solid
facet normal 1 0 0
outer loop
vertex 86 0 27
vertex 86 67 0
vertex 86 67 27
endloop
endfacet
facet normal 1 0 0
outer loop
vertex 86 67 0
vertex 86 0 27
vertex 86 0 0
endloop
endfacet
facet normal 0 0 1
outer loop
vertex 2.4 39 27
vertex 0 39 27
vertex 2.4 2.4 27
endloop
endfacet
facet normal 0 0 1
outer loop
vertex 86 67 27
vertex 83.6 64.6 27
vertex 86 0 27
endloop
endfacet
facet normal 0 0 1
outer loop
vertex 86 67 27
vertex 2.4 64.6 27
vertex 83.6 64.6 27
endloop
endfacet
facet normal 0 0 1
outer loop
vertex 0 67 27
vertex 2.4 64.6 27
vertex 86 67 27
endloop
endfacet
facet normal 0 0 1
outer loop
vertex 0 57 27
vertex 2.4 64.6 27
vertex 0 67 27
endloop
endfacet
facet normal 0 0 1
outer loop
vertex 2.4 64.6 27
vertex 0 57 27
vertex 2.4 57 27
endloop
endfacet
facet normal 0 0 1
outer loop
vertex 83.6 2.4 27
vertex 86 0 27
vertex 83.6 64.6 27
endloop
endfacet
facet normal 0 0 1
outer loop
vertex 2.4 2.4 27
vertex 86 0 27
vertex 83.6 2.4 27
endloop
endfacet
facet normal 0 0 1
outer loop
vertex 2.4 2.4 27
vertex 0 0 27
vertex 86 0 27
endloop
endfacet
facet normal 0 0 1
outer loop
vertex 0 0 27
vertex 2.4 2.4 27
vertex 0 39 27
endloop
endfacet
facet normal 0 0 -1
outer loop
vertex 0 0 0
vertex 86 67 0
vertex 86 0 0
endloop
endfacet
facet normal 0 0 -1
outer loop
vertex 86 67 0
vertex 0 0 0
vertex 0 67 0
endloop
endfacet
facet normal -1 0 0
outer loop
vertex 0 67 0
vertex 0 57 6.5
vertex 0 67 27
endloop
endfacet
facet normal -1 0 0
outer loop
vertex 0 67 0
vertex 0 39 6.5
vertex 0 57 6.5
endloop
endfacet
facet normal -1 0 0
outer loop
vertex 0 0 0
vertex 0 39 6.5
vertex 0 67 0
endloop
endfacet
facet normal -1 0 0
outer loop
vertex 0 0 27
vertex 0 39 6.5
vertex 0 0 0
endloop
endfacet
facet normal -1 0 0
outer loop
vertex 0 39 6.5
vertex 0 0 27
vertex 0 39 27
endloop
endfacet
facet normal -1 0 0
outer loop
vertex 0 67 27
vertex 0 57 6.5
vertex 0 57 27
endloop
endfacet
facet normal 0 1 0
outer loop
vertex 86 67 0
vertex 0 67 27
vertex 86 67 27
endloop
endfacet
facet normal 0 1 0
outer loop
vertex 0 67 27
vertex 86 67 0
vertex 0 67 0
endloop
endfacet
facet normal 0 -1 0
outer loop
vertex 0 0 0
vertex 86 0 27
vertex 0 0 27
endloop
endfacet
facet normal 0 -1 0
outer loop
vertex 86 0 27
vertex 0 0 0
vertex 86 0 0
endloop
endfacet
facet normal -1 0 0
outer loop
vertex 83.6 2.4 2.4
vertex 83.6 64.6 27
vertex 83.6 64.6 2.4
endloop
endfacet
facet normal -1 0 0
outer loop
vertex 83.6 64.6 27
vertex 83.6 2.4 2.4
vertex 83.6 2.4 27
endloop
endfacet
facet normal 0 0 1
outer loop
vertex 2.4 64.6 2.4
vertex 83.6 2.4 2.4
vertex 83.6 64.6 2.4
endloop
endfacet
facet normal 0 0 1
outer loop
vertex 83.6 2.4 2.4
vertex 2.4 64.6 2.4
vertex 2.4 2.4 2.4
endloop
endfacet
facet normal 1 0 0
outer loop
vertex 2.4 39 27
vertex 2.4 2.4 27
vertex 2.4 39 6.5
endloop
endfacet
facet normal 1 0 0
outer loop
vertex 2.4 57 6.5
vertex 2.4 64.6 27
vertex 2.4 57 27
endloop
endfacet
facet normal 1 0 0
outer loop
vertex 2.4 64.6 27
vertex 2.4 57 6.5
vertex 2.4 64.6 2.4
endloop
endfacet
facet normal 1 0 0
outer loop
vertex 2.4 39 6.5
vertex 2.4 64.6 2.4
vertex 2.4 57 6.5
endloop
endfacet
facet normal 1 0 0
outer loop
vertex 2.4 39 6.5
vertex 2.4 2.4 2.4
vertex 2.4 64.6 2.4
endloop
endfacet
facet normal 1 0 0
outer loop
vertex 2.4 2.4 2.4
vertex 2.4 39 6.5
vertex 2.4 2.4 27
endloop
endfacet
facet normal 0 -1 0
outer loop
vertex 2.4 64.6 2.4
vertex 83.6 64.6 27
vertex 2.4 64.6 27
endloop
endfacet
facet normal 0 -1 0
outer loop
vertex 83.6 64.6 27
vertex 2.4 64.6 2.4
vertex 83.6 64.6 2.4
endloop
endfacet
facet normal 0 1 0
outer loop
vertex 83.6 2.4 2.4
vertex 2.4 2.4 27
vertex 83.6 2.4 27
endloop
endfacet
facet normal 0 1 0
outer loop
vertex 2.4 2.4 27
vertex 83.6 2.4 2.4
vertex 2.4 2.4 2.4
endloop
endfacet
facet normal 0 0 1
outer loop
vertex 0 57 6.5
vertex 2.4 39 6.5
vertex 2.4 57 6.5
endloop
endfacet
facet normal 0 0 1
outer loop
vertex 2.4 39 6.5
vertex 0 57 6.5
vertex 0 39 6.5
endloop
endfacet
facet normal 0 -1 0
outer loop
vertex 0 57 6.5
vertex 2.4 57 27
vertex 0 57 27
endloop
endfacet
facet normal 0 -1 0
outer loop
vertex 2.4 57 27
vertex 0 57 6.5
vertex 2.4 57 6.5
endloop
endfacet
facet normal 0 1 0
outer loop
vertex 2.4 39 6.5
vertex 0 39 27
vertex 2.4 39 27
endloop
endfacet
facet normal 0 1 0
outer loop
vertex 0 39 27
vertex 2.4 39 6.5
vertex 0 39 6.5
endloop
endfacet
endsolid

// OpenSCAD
// Units: mm. The front wall is at x = 0. Measure your own board and plug.
part = "base"; // [base,lid,gauge]
length = 86;
width = 67;
height = 27;
wall = 2.4;
floor = 2.4;
lid_thickness = 2.4;
usb_center = 48; // distance from the y = 0 long edge
usb_width = 18;
usb_bottom = 6.5; // measured from the outside bottom of the base
lid_gap = 0.35; // clearance per side on each locating tab
eps = 0.02;
tab_depth = 3;

assert(length >= 82 && width >= 64 && height >= 24,
       "Keep enough room for the Uno, supports and cable.");
assert(usb_center - usb_width/2 > wall && usb_center + usb_width/2 < width-wall,
       "USB notch must stay between the long walls.");
assert(usb_bottom > floor && usb_bottom < height-10,
       "Keep material below the notch and space above the plug.");
assert(lid_gap > 0 && lid_gap <= 1, "Check the lid clearance.");

module base() {
    difference() {
        cube([length,width,height]);
        translate([wall,wall,floor])
            cube([length-2*wall,width-2*wall,height]);
        translate([-eps,usb_center-usb_width/2,usb_bottom])
            cube([wall+2*eps,usb_width,height]);
    }
}

module lid() {
    // Exterior face down for printing. Flip over and keep the long edges parallel to close.
    difference() {
        union() {
            cube([length,width,lid_thickness]);
            for (x = [12,length-22], y = [wall+lid_gap,width-wall-lid_gap-2])
                translate([x,y,lid_thickness-eps])
                    cube([10,2,tab_depth+eps]);
        }
        for (i = [-2:2])
            translate([length/2-13,width/2+i*5-1,-eps])
                cube([26,2,lid_thickness+2*eps]);
    }
}

module gauge() {
    // Face-down sample of the same open USB notch, for a quick width check.
    difference() {
        cube([height,usb_width+10,wall]);
        translate([usb_bottom,5,-eps])
            cube([height,usb_width,wall+2*eps]);
    }
}

if (part == "base") base();
else if (part == "lid") lid();
else if (part == "gauge") gauge();
else assert(false, "Choose base, lid or gauge.");
